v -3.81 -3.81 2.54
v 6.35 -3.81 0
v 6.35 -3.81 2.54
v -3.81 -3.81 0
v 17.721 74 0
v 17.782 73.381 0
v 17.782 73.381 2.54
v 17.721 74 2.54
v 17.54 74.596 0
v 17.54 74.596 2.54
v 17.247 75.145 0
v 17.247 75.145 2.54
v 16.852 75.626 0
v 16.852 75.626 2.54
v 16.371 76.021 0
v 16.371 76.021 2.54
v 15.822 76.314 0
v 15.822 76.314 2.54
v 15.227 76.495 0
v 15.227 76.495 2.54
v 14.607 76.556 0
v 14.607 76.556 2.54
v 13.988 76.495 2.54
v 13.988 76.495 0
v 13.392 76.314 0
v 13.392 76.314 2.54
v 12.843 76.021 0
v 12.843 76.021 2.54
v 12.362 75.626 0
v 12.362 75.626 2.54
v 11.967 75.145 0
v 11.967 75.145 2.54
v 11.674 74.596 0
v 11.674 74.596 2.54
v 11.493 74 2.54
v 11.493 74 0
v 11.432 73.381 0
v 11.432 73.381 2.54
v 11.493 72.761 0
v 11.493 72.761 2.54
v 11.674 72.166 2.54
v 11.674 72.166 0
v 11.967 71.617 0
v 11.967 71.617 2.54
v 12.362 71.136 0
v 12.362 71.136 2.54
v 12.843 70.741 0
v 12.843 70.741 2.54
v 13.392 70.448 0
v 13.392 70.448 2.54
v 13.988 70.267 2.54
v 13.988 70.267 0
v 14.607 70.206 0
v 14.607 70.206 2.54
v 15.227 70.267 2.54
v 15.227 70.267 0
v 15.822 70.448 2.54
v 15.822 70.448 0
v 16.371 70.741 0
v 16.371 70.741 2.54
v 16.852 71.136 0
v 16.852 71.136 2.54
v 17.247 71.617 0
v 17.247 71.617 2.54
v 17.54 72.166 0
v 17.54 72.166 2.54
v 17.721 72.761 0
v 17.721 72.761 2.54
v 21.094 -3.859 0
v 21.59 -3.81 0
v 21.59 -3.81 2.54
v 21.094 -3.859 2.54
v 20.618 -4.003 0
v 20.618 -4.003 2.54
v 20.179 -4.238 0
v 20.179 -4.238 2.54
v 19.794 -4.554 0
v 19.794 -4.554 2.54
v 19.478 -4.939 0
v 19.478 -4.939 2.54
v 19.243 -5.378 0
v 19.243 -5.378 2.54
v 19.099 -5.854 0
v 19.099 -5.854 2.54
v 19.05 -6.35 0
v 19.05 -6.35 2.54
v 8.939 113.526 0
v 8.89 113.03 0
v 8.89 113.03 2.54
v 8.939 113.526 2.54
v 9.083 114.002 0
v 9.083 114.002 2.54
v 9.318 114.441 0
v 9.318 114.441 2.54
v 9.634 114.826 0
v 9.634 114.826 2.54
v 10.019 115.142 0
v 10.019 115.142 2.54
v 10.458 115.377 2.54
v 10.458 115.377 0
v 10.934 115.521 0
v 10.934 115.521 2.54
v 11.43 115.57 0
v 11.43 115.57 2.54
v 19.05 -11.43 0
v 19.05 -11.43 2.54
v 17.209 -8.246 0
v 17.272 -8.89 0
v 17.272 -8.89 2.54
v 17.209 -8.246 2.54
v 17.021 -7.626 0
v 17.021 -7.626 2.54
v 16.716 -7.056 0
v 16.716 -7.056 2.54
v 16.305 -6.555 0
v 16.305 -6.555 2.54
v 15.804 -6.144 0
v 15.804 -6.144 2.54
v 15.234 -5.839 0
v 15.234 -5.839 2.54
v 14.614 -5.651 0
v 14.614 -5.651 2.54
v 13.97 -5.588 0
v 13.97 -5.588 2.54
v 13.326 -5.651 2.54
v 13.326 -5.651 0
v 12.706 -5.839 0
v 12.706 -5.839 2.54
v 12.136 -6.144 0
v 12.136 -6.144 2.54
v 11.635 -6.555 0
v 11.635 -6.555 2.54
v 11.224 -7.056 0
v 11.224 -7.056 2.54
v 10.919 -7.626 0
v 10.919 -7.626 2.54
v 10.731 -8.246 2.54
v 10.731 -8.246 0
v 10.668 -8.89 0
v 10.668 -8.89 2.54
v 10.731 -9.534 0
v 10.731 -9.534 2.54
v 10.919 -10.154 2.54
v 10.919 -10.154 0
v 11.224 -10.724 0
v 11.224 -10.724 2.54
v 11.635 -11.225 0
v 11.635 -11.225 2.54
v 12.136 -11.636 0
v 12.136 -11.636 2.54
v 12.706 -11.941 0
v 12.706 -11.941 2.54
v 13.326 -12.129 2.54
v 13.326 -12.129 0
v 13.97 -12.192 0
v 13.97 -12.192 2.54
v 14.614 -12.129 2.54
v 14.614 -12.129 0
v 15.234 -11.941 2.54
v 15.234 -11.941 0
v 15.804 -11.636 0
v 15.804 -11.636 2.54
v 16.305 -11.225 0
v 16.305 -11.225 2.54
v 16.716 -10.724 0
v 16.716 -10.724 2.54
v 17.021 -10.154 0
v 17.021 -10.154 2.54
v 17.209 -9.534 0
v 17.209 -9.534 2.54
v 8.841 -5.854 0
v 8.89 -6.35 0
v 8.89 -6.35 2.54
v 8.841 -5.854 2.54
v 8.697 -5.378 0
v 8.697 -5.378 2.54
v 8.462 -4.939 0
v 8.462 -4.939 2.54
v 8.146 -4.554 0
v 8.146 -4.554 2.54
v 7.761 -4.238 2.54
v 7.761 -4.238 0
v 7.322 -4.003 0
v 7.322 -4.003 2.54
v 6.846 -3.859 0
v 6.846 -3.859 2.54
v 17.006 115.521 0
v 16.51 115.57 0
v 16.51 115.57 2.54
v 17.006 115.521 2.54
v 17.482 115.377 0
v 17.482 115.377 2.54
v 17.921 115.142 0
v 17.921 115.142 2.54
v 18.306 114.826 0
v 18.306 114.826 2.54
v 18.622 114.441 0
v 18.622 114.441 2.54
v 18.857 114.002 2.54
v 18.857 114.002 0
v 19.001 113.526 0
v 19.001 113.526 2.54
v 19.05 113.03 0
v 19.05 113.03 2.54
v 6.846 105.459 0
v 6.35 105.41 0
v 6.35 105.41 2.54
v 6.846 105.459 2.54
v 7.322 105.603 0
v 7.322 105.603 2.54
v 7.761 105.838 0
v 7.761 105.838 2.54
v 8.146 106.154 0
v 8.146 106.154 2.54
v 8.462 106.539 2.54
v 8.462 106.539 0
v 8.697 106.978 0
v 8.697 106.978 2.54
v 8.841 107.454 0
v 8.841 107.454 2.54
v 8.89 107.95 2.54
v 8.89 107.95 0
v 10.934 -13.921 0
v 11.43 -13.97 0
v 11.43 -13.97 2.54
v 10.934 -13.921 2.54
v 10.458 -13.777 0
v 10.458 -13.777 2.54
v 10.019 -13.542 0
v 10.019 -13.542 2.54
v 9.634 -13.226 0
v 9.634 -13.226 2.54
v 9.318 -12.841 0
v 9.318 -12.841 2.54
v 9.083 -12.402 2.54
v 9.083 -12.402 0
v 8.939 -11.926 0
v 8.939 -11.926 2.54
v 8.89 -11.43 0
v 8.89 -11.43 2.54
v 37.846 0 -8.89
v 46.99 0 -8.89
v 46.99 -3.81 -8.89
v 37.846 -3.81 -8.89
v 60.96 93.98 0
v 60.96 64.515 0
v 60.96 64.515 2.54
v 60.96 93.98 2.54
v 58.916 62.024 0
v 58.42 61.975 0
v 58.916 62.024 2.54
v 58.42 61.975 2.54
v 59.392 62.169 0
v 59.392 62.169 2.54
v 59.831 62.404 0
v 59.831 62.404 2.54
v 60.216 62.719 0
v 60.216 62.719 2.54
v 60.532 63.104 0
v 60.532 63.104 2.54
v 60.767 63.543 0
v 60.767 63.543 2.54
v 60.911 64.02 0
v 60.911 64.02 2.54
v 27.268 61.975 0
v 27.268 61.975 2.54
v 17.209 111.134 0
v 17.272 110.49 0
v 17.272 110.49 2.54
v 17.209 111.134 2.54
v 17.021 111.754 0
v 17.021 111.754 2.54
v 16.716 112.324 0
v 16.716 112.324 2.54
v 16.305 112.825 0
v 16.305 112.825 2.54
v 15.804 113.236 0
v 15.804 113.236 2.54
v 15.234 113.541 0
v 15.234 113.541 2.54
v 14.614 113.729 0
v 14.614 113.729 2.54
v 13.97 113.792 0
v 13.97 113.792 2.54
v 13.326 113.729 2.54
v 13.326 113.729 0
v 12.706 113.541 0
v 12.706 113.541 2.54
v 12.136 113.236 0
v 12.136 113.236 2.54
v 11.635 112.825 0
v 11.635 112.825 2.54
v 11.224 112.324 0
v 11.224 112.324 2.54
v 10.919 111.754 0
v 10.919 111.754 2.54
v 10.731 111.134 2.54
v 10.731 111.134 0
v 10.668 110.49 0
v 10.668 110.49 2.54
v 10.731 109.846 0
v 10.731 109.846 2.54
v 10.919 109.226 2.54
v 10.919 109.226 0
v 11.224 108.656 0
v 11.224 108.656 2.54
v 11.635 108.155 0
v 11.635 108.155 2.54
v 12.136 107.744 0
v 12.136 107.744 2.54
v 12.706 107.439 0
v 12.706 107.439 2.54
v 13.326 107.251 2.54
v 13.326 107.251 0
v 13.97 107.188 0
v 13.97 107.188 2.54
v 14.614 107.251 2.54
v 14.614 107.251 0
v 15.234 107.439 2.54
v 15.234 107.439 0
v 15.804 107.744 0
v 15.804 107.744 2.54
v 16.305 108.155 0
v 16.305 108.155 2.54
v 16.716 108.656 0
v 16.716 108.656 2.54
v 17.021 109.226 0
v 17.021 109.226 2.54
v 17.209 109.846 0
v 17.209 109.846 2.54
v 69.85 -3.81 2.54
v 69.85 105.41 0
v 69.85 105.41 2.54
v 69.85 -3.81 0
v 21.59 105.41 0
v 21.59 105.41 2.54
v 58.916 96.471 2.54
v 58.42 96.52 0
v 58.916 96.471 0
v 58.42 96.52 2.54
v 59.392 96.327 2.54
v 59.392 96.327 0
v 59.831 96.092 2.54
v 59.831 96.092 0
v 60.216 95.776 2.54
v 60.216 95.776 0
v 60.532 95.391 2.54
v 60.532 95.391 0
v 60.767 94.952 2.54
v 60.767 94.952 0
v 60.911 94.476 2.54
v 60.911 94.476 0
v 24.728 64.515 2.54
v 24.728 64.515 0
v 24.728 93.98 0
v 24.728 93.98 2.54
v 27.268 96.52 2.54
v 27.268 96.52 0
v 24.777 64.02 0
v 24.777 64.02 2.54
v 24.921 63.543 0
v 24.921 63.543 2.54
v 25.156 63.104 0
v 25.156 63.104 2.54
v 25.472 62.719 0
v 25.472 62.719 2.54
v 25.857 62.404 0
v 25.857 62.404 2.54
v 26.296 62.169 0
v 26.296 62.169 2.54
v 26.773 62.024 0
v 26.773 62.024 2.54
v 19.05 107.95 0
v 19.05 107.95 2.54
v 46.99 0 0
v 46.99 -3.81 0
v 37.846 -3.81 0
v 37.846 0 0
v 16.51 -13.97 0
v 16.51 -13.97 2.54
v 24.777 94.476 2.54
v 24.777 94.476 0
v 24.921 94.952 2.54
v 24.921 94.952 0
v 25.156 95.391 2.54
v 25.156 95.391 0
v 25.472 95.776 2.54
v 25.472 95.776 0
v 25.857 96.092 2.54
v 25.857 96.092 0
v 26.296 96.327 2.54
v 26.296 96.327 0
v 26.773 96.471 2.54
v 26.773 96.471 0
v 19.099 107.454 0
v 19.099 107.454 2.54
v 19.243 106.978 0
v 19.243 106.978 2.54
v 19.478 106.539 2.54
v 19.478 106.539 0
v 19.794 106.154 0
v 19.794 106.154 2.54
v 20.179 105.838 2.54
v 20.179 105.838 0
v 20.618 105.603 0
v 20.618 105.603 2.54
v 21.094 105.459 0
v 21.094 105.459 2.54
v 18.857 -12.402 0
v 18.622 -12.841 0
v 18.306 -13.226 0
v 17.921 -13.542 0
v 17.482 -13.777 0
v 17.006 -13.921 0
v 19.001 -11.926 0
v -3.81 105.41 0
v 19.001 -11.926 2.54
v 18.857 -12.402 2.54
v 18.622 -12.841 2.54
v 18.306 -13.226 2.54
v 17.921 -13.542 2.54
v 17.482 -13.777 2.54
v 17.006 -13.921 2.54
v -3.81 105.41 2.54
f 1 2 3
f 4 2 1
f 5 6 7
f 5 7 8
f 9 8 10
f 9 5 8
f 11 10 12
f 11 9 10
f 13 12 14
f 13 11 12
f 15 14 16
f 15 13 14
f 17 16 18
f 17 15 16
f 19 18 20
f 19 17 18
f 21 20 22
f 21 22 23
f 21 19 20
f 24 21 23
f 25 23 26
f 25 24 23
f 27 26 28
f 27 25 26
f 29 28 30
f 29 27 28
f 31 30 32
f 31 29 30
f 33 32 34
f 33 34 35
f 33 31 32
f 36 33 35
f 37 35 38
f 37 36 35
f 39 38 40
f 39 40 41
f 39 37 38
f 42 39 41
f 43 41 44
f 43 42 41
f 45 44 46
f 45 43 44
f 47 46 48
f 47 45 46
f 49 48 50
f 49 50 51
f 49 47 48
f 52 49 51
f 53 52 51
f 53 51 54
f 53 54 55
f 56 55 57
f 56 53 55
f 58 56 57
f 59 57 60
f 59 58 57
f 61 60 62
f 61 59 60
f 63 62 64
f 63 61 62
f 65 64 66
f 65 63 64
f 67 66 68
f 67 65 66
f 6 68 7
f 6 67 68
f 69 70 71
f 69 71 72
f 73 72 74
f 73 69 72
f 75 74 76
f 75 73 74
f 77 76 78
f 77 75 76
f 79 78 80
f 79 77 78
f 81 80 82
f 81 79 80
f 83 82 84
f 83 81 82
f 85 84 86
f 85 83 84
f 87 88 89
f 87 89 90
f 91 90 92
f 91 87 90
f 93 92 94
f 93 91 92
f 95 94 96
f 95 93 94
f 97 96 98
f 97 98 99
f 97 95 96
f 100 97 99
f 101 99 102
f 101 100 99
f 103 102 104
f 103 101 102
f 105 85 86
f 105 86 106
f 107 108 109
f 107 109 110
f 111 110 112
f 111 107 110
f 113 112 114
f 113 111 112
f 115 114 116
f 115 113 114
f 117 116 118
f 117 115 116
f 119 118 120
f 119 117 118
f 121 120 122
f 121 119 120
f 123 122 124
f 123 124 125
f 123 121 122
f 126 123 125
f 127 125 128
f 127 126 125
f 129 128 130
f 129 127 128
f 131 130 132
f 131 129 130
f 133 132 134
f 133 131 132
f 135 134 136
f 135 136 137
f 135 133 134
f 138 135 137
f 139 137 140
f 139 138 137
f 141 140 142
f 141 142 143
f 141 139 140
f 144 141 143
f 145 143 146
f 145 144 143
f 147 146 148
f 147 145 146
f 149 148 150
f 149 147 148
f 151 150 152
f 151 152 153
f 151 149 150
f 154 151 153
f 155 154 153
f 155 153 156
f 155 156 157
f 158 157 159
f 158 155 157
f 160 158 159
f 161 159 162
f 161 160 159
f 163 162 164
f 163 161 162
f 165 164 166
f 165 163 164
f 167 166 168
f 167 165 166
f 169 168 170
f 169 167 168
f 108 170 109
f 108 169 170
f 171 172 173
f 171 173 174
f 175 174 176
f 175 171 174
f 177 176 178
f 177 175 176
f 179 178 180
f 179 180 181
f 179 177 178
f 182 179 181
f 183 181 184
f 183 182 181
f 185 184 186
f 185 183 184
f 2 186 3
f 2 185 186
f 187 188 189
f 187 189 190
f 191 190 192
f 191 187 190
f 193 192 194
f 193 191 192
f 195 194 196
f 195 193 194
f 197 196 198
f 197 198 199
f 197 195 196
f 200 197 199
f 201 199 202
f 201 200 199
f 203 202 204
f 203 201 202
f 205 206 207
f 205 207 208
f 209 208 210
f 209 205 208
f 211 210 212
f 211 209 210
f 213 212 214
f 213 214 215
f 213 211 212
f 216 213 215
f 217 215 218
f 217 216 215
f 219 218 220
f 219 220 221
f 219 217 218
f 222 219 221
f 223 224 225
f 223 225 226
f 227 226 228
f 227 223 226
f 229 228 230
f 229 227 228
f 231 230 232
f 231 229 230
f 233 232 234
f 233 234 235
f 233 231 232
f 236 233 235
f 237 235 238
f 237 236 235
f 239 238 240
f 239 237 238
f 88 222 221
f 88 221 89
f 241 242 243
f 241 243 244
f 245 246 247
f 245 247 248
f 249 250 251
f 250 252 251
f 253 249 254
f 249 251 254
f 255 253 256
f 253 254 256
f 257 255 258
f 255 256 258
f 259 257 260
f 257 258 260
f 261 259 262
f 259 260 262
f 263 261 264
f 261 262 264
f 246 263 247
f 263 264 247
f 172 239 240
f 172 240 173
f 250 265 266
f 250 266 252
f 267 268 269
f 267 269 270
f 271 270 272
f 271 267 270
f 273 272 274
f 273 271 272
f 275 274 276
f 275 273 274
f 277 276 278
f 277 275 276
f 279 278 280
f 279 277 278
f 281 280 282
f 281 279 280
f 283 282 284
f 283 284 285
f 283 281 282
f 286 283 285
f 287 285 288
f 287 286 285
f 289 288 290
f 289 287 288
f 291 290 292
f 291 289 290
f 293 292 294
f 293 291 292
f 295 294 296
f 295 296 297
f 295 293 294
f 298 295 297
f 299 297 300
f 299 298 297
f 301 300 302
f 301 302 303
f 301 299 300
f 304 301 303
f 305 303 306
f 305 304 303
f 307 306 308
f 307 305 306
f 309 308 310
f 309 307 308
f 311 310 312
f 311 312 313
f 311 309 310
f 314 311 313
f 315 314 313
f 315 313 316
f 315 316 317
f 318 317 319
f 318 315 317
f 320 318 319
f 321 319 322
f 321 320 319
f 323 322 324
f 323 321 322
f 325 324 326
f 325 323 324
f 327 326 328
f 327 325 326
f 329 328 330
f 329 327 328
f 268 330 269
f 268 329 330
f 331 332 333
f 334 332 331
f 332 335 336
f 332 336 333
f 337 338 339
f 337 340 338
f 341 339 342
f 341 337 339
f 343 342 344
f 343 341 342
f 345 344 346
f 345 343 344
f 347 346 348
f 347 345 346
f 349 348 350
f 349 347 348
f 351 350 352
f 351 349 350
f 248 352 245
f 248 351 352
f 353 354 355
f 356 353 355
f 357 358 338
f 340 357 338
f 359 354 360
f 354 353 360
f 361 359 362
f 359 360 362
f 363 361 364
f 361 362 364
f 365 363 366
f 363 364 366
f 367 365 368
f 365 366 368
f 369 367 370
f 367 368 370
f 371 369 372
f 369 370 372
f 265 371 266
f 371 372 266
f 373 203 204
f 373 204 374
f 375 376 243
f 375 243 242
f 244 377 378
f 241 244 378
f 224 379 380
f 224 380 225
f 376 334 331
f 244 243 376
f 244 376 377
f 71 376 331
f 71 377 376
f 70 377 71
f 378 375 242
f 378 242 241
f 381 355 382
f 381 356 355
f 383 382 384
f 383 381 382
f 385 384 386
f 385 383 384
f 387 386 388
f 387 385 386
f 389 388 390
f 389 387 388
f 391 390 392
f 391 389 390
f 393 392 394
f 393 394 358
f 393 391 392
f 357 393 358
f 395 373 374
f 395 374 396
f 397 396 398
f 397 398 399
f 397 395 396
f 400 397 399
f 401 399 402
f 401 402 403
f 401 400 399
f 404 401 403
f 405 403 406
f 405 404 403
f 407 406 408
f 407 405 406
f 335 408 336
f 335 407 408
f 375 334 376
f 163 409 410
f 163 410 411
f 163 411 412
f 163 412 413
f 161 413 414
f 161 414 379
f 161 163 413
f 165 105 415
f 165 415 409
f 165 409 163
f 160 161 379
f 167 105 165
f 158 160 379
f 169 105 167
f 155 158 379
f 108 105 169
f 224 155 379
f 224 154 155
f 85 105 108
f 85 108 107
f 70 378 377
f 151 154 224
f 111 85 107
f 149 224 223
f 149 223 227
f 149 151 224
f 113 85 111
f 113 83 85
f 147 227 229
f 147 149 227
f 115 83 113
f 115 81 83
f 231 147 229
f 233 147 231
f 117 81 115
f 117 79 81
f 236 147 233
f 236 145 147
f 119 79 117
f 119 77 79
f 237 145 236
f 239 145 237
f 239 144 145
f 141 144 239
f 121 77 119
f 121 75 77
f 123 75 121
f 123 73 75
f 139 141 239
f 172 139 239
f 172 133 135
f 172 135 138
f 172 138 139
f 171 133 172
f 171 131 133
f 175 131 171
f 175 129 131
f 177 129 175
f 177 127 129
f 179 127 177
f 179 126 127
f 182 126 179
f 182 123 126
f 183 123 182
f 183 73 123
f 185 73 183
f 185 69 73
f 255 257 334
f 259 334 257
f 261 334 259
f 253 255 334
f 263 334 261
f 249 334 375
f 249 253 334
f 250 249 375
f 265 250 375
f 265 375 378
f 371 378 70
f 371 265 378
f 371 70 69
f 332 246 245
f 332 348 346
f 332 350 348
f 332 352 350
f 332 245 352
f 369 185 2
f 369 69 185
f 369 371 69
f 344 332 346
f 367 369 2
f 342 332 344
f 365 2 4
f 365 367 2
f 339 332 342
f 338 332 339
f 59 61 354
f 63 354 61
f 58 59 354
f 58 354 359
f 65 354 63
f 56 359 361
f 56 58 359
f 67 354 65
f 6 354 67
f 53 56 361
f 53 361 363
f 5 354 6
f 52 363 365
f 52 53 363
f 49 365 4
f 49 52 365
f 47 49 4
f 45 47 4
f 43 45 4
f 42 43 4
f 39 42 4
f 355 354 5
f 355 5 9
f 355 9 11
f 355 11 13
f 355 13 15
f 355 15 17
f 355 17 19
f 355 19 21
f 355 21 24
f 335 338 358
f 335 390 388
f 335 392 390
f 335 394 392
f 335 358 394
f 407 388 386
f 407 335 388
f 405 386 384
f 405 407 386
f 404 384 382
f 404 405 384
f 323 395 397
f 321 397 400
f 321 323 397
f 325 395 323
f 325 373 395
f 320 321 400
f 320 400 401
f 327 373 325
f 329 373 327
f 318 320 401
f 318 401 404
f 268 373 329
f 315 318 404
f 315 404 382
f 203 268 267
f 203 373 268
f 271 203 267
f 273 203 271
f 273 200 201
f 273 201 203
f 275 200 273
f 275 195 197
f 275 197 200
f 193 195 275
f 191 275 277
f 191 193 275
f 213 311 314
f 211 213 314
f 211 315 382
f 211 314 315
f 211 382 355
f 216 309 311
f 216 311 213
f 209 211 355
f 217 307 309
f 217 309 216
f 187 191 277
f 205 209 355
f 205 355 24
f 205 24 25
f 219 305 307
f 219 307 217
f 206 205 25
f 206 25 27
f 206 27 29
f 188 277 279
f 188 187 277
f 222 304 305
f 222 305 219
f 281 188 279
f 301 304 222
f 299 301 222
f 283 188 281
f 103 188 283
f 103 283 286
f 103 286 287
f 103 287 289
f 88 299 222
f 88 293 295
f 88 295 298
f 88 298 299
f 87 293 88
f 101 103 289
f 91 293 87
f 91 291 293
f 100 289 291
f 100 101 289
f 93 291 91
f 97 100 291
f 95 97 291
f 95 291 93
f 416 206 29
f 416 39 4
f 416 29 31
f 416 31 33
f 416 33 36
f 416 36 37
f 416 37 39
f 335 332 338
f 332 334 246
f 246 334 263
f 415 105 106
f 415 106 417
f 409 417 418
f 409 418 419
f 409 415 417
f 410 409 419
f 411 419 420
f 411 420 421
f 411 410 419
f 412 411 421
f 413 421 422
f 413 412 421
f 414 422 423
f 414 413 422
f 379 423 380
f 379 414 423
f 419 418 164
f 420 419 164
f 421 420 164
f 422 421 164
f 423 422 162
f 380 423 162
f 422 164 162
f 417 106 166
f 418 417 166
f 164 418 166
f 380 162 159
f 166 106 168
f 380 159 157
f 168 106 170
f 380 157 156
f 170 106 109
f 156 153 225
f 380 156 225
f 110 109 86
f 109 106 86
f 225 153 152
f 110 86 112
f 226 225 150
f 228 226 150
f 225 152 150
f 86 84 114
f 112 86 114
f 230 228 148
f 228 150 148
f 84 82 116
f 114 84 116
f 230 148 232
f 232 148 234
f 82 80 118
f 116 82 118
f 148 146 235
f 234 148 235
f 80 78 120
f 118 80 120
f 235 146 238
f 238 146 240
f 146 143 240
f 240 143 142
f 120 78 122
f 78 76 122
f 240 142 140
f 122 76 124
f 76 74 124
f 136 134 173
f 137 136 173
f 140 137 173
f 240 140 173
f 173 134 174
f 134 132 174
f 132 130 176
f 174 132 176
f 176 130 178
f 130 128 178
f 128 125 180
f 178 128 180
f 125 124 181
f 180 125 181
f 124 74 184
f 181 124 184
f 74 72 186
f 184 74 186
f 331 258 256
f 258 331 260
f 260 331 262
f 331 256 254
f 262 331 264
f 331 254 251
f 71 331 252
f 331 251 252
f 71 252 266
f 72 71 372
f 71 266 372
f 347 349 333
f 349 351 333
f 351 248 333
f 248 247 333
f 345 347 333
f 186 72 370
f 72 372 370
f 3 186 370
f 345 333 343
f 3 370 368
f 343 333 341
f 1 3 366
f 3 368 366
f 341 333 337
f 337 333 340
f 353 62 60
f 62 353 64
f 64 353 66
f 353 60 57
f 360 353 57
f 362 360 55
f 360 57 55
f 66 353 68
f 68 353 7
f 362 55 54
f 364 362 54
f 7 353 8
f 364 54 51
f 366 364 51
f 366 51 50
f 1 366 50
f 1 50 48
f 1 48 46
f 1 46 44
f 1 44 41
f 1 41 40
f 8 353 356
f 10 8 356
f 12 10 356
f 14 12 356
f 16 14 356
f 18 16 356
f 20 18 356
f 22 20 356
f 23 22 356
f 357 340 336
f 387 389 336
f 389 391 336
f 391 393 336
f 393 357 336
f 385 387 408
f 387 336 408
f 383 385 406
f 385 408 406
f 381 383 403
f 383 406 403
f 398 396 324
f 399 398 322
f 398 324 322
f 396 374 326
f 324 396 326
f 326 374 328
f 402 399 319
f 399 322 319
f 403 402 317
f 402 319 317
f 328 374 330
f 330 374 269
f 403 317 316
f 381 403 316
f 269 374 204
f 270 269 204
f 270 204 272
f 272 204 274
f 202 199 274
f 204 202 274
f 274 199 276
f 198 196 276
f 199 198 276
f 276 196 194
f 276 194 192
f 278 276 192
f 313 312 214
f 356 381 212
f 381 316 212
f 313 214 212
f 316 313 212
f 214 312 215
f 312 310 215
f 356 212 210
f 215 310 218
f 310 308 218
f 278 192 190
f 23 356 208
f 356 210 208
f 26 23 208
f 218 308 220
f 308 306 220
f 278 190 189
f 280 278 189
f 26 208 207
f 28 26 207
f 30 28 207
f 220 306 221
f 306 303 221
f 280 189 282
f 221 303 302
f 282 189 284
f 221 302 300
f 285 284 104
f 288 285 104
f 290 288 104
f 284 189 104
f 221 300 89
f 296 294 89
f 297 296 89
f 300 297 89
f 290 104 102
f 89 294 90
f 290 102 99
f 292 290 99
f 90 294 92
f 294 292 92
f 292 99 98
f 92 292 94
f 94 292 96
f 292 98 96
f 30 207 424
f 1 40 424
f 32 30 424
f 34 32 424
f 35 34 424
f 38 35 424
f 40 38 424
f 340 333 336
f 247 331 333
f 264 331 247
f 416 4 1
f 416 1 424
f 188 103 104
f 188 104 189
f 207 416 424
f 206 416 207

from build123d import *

# Parameters (mm, degrees)
SKETCH1_R           = 3.302
SKETCH1_R_2         = 3.175
SKETCH1_W           = 36.231873889
SKETCH1_H           = 34.54456272
BOSS_EXTRUDE1_DEPTH = 2.54
SKETCH3_W           = 9.144
SKETCH3_H           = 3.81
BOSS_EXTRUDE2_DEPTH = 8.89
FILLET1_R           = 2.54


with BuildPart() as part:
    # Sketch1 → Boss-Extrude1 (new body)
    with BuildSketch(Plane.XY):
        with BuildLine():
            Line((19.05, 113.03), (19.05, 107.95))
            ThreePointArc((19.05, 107.95), (19.793948776, 106.153948776), (21.59, 105.41))
            Line((21.59, 105.41), (69.85, 105.41))
            Line((69.85, 105.41), (69.85, -3.81))
            Line((69.85, -3.81), (21.59, -3.81))
            ThreePointArc((21.59, -3.81), (19.793948776, -4.553948776), (19.05, -6.35))
            Line((19.05, -6.35), (19.05, -11.43))
            ThreePointArc((19.05, -11.43), (18.306051224, -13.226051224), (16.51, -13.97))
            Line((16.51, -13.97), (11.43, -13.97))
            ThreePointArc((11.43, -13.97), (9.633948776, -13.226051224), (8.89, -11.43))
            Line((8.89, -11.43), (8.89, -6.35))
            ThreePointArc((8.89, -6.35), (8.146051224, -4.553948776), (6.35, -3.81))
            Line((6.35, -3.81), (-3.81, -3.81))
            Line((-3.81, -3.81), (-3.81, 105.41))
            Line((-3.81, 105.41), (6.35, 105.41))
            ThreePointArc((6.35, 105.41), (8.146051224, 106.153948776), (8.89, 107.95))
            Line((8.89, 107.95), (8.89, 113.03))
            ThreePointArc((8.89, 113.03), (9.633948776, 114.826051224), (11.43, 115.57))
            Line((11.43, 115.57), (16.51, 115.57))
            ThreePointArc((16.51, 115.57), (18.306051224, 114.826051224), (19.05, 113.03))
        make_face()
        with Locations((13.97, 110.49)):
            Circle(SKETCH1_R, mode=Mode.SUBTRACT)
        with Locations((13.97, -8.89)):
            Circle(SKETCH1_R, mode=Mode.SUBTRACT)
        with Locations((14.607116803, 73.380830868)):
            Circle(SKETCH1_R_2, mode=Mode.SUBTRACT)
        with Locations((42.844063056, 79.24771864)):
            Rectangle(SKETCH1_W, SKETCH1_H, mode=Mode.SUBTRACT)
    extrude(amount=BOSS_EXTRUDE1_DEPTH)

    # Sketch3 → Boss-Extrude2 (add)
    with BuildSketch(Plane(origin=(0, 0, 0), x_dir=(-1, 0, 0), z_dir=(0, 0, -1))):
        with Locations((-42.418, -1.905)):
            Rectangle(SKETCH3_W, SKETCH3_H)
    extrude(amount=BOSS_EXTRUDE2_DEPTH)

    # Fillet1
    fillet1_edges = [part.edges().sort_by_distance(p)[0] for p in [
        (24.728126111, 61.97543728, 1.27),
        (60.96, 61.97543728, 1.27),
        (60.96, 96.52, 1.27),
        (24.728126111, 96.52, 1.27),
    ]]
    fillet(fillet1_edges, radius=FILLET1_R)


solid = part.part
